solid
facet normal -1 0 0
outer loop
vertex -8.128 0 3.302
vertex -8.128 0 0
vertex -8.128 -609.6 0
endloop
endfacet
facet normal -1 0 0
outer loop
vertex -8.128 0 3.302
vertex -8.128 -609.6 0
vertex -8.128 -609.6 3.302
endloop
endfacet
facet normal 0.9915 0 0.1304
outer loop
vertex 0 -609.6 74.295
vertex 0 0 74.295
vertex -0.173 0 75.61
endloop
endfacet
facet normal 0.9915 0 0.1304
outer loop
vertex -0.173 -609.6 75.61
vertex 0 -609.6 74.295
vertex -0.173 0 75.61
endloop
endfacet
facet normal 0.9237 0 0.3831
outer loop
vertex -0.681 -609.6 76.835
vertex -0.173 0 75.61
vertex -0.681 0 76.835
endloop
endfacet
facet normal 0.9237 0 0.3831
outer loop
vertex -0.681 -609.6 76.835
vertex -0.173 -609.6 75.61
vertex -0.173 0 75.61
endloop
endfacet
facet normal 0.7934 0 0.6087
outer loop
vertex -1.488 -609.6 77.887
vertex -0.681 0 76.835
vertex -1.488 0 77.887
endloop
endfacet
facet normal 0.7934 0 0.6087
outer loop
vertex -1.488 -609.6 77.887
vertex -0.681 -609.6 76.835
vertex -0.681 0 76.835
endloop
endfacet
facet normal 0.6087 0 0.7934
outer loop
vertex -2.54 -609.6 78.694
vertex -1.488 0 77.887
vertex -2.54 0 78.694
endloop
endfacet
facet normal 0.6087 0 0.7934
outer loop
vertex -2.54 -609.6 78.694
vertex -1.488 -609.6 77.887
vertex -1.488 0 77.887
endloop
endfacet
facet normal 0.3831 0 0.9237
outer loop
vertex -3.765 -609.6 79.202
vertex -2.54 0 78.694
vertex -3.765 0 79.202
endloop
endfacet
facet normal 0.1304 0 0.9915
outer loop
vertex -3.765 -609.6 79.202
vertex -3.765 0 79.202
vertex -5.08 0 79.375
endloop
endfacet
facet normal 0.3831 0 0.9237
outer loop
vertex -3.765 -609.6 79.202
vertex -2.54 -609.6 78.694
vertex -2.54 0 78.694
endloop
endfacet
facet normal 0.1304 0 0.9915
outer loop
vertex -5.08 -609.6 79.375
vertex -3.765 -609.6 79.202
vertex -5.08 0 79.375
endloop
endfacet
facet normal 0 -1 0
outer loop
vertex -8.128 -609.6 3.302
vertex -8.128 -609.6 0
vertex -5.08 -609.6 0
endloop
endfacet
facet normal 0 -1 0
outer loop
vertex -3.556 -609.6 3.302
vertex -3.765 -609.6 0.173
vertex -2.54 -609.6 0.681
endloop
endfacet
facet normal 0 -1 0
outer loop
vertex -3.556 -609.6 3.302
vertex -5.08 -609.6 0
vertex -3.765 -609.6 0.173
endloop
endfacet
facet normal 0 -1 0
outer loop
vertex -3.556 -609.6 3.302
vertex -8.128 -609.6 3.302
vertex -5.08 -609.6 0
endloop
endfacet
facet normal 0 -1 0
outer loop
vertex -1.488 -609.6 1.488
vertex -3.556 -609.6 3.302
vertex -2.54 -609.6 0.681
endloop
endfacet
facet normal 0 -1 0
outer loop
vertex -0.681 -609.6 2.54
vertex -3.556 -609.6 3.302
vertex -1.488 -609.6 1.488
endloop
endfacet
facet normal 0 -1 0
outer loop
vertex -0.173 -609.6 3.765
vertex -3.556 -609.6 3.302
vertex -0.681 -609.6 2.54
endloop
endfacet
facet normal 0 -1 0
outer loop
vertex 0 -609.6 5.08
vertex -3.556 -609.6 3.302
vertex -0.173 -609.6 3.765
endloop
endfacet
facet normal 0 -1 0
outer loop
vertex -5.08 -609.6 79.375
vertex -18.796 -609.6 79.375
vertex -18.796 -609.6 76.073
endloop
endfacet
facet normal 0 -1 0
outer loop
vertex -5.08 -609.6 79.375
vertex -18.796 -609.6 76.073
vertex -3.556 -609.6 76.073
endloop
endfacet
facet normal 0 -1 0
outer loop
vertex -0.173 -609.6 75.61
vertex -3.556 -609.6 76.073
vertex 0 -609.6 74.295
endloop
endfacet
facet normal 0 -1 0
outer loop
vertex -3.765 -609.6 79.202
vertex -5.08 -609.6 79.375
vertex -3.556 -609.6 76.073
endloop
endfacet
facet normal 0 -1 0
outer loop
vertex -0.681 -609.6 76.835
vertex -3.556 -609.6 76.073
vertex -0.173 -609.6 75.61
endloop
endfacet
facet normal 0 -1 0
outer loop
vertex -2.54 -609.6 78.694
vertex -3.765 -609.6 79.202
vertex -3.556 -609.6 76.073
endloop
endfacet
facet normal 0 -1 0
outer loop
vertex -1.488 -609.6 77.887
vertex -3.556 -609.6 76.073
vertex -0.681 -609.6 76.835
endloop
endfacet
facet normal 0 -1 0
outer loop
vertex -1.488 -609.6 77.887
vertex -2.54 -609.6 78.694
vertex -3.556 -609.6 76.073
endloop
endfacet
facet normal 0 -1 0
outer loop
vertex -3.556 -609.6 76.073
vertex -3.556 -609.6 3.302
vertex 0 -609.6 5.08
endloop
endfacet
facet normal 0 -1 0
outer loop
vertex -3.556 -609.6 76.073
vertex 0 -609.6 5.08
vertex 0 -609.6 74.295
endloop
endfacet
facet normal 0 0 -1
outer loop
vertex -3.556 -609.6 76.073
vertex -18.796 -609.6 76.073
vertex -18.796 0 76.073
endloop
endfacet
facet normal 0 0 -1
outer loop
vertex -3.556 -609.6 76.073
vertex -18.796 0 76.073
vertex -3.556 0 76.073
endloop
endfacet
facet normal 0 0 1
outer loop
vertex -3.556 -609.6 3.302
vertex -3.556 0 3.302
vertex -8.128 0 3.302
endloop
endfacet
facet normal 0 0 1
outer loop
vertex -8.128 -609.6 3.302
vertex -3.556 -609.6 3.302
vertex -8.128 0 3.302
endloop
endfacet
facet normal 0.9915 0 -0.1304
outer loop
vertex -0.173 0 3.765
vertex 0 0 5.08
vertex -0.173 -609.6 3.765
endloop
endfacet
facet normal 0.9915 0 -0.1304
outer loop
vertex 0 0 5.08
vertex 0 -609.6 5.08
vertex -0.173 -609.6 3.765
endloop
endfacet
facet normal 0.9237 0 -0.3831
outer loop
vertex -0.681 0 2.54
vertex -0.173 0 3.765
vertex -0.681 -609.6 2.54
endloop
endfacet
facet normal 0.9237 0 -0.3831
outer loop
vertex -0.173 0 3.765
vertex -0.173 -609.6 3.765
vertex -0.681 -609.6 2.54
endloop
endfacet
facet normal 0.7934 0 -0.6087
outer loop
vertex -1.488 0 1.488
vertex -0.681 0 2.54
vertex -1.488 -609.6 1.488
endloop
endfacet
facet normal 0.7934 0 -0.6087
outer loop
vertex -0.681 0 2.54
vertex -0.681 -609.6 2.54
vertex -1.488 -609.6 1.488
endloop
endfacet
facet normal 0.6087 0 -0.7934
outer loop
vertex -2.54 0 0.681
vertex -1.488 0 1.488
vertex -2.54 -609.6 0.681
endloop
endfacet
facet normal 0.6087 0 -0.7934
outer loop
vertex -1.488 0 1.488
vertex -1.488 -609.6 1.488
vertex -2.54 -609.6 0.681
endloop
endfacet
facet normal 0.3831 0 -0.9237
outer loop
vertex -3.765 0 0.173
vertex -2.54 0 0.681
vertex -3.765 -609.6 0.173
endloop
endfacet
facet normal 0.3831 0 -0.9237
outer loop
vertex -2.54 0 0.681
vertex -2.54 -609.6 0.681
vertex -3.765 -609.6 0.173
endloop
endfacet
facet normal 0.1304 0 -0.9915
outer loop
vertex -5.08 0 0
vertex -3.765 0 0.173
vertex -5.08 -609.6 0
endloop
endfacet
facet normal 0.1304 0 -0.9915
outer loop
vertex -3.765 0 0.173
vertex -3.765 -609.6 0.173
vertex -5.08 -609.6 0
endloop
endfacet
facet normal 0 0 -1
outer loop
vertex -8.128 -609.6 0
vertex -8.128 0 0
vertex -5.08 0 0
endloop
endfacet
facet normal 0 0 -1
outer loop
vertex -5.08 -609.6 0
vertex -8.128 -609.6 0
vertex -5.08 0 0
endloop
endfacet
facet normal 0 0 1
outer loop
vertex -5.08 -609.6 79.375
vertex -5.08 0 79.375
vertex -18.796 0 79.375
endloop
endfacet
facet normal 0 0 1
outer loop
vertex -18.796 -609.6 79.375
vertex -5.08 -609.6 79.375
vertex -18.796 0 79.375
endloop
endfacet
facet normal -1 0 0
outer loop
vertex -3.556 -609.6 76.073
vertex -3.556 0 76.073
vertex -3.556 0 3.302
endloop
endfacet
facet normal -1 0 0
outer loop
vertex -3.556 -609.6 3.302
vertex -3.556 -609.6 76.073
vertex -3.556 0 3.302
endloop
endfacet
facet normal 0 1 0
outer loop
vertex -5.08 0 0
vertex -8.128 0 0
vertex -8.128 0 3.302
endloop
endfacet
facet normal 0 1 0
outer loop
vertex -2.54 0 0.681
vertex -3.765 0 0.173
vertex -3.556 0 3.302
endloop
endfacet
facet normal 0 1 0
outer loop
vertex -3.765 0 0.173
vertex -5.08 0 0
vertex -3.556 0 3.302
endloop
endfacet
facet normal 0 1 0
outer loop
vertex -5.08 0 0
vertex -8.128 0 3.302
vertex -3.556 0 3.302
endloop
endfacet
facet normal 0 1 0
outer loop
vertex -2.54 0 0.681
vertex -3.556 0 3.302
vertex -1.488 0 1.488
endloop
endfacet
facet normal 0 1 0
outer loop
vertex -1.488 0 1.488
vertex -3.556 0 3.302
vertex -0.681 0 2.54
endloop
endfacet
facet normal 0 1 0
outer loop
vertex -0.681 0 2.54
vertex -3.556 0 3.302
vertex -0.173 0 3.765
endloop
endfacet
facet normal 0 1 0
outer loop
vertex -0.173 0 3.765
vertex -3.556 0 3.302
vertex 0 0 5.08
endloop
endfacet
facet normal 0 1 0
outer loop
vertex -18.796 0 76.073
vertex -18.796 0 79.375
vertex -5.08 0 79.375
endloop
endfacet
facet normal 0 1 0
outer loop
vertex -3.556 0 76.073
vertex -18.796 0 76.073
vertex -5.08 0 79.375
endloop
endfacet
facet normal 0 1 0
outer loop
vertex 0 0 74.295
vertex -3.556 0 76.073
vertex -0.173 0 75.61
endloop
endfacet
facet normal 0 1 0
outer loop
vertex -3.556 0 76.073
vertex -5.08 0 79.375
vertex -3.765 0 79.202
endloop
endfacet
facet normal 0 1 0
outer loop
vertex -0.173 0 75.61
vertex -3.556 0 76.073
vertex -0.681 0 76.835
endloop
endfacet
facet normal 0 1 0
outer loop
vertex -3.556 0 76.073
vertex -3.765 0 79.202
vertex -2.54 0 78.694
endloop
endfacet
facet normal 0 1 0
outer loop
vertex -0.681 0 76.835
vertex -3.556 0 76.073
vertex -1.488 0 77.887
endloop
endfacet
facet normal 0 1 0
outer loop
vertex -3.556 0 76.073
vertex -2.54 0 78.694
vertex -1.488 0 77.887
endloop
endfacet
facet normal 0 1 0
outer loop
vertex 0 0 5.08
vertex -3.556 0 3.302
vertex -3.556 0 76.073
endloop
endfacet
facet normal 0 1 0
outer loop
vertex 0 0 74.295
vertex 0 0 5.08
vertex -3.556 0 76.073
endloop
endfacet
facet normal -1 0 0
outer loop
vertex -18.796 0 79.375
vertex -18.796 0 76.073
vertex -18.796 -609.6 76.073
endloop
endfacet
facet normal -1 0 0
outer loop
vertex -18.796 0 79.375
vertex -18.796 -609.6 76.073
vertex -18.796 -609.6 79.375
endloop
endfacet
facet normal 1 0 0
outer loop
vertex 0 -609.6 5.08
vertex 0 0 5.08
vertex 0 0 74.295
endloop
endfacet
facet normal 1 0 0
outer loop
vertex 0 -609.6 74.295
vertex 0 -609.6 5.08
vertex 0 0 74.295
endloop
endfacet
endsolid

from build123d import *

# Parameters (mm, degrees)
F0_W     = 3.556
F0_H     = 3.302
F0_W_2   = 4.572
F0_H_2   = 72.771
F0_W_3   = 15.24
F1_DEPTH = 609.6
F2_R     = 5.08


with BuildPart() as f1:
    # F0 (on Front) → F1 (new body)
    with BuildSketch(Plane.XZ):
        with Locations((-1.778, 1.651)):
            Rectangle(F0_W, F0_H)
        with Locations((-5.842, 1.651)):
            Rectangle(F0_W_2, F0_H)
        with Locations((-1.778, 39.6875)):
            Rectangle(F0_W, F0_H_2)
        with Locations((-1.778, 77.724)):
            Rectangle(F0_W, F0_H)
        with Locations((-11.176, 77.724)):
            Rectangle(F0_W_3, F0_H)
    extrude(amount=F1_DEPTH)

    # F2
    f2_edges = [f1.edges().sort_by_distance(p)[0] for p in [
        (0, -304.8, 79.375),
        (0, -304.8, 0),
    ]]
    fillet(f2_edges, radius=F2_R)


solid = f1.part
